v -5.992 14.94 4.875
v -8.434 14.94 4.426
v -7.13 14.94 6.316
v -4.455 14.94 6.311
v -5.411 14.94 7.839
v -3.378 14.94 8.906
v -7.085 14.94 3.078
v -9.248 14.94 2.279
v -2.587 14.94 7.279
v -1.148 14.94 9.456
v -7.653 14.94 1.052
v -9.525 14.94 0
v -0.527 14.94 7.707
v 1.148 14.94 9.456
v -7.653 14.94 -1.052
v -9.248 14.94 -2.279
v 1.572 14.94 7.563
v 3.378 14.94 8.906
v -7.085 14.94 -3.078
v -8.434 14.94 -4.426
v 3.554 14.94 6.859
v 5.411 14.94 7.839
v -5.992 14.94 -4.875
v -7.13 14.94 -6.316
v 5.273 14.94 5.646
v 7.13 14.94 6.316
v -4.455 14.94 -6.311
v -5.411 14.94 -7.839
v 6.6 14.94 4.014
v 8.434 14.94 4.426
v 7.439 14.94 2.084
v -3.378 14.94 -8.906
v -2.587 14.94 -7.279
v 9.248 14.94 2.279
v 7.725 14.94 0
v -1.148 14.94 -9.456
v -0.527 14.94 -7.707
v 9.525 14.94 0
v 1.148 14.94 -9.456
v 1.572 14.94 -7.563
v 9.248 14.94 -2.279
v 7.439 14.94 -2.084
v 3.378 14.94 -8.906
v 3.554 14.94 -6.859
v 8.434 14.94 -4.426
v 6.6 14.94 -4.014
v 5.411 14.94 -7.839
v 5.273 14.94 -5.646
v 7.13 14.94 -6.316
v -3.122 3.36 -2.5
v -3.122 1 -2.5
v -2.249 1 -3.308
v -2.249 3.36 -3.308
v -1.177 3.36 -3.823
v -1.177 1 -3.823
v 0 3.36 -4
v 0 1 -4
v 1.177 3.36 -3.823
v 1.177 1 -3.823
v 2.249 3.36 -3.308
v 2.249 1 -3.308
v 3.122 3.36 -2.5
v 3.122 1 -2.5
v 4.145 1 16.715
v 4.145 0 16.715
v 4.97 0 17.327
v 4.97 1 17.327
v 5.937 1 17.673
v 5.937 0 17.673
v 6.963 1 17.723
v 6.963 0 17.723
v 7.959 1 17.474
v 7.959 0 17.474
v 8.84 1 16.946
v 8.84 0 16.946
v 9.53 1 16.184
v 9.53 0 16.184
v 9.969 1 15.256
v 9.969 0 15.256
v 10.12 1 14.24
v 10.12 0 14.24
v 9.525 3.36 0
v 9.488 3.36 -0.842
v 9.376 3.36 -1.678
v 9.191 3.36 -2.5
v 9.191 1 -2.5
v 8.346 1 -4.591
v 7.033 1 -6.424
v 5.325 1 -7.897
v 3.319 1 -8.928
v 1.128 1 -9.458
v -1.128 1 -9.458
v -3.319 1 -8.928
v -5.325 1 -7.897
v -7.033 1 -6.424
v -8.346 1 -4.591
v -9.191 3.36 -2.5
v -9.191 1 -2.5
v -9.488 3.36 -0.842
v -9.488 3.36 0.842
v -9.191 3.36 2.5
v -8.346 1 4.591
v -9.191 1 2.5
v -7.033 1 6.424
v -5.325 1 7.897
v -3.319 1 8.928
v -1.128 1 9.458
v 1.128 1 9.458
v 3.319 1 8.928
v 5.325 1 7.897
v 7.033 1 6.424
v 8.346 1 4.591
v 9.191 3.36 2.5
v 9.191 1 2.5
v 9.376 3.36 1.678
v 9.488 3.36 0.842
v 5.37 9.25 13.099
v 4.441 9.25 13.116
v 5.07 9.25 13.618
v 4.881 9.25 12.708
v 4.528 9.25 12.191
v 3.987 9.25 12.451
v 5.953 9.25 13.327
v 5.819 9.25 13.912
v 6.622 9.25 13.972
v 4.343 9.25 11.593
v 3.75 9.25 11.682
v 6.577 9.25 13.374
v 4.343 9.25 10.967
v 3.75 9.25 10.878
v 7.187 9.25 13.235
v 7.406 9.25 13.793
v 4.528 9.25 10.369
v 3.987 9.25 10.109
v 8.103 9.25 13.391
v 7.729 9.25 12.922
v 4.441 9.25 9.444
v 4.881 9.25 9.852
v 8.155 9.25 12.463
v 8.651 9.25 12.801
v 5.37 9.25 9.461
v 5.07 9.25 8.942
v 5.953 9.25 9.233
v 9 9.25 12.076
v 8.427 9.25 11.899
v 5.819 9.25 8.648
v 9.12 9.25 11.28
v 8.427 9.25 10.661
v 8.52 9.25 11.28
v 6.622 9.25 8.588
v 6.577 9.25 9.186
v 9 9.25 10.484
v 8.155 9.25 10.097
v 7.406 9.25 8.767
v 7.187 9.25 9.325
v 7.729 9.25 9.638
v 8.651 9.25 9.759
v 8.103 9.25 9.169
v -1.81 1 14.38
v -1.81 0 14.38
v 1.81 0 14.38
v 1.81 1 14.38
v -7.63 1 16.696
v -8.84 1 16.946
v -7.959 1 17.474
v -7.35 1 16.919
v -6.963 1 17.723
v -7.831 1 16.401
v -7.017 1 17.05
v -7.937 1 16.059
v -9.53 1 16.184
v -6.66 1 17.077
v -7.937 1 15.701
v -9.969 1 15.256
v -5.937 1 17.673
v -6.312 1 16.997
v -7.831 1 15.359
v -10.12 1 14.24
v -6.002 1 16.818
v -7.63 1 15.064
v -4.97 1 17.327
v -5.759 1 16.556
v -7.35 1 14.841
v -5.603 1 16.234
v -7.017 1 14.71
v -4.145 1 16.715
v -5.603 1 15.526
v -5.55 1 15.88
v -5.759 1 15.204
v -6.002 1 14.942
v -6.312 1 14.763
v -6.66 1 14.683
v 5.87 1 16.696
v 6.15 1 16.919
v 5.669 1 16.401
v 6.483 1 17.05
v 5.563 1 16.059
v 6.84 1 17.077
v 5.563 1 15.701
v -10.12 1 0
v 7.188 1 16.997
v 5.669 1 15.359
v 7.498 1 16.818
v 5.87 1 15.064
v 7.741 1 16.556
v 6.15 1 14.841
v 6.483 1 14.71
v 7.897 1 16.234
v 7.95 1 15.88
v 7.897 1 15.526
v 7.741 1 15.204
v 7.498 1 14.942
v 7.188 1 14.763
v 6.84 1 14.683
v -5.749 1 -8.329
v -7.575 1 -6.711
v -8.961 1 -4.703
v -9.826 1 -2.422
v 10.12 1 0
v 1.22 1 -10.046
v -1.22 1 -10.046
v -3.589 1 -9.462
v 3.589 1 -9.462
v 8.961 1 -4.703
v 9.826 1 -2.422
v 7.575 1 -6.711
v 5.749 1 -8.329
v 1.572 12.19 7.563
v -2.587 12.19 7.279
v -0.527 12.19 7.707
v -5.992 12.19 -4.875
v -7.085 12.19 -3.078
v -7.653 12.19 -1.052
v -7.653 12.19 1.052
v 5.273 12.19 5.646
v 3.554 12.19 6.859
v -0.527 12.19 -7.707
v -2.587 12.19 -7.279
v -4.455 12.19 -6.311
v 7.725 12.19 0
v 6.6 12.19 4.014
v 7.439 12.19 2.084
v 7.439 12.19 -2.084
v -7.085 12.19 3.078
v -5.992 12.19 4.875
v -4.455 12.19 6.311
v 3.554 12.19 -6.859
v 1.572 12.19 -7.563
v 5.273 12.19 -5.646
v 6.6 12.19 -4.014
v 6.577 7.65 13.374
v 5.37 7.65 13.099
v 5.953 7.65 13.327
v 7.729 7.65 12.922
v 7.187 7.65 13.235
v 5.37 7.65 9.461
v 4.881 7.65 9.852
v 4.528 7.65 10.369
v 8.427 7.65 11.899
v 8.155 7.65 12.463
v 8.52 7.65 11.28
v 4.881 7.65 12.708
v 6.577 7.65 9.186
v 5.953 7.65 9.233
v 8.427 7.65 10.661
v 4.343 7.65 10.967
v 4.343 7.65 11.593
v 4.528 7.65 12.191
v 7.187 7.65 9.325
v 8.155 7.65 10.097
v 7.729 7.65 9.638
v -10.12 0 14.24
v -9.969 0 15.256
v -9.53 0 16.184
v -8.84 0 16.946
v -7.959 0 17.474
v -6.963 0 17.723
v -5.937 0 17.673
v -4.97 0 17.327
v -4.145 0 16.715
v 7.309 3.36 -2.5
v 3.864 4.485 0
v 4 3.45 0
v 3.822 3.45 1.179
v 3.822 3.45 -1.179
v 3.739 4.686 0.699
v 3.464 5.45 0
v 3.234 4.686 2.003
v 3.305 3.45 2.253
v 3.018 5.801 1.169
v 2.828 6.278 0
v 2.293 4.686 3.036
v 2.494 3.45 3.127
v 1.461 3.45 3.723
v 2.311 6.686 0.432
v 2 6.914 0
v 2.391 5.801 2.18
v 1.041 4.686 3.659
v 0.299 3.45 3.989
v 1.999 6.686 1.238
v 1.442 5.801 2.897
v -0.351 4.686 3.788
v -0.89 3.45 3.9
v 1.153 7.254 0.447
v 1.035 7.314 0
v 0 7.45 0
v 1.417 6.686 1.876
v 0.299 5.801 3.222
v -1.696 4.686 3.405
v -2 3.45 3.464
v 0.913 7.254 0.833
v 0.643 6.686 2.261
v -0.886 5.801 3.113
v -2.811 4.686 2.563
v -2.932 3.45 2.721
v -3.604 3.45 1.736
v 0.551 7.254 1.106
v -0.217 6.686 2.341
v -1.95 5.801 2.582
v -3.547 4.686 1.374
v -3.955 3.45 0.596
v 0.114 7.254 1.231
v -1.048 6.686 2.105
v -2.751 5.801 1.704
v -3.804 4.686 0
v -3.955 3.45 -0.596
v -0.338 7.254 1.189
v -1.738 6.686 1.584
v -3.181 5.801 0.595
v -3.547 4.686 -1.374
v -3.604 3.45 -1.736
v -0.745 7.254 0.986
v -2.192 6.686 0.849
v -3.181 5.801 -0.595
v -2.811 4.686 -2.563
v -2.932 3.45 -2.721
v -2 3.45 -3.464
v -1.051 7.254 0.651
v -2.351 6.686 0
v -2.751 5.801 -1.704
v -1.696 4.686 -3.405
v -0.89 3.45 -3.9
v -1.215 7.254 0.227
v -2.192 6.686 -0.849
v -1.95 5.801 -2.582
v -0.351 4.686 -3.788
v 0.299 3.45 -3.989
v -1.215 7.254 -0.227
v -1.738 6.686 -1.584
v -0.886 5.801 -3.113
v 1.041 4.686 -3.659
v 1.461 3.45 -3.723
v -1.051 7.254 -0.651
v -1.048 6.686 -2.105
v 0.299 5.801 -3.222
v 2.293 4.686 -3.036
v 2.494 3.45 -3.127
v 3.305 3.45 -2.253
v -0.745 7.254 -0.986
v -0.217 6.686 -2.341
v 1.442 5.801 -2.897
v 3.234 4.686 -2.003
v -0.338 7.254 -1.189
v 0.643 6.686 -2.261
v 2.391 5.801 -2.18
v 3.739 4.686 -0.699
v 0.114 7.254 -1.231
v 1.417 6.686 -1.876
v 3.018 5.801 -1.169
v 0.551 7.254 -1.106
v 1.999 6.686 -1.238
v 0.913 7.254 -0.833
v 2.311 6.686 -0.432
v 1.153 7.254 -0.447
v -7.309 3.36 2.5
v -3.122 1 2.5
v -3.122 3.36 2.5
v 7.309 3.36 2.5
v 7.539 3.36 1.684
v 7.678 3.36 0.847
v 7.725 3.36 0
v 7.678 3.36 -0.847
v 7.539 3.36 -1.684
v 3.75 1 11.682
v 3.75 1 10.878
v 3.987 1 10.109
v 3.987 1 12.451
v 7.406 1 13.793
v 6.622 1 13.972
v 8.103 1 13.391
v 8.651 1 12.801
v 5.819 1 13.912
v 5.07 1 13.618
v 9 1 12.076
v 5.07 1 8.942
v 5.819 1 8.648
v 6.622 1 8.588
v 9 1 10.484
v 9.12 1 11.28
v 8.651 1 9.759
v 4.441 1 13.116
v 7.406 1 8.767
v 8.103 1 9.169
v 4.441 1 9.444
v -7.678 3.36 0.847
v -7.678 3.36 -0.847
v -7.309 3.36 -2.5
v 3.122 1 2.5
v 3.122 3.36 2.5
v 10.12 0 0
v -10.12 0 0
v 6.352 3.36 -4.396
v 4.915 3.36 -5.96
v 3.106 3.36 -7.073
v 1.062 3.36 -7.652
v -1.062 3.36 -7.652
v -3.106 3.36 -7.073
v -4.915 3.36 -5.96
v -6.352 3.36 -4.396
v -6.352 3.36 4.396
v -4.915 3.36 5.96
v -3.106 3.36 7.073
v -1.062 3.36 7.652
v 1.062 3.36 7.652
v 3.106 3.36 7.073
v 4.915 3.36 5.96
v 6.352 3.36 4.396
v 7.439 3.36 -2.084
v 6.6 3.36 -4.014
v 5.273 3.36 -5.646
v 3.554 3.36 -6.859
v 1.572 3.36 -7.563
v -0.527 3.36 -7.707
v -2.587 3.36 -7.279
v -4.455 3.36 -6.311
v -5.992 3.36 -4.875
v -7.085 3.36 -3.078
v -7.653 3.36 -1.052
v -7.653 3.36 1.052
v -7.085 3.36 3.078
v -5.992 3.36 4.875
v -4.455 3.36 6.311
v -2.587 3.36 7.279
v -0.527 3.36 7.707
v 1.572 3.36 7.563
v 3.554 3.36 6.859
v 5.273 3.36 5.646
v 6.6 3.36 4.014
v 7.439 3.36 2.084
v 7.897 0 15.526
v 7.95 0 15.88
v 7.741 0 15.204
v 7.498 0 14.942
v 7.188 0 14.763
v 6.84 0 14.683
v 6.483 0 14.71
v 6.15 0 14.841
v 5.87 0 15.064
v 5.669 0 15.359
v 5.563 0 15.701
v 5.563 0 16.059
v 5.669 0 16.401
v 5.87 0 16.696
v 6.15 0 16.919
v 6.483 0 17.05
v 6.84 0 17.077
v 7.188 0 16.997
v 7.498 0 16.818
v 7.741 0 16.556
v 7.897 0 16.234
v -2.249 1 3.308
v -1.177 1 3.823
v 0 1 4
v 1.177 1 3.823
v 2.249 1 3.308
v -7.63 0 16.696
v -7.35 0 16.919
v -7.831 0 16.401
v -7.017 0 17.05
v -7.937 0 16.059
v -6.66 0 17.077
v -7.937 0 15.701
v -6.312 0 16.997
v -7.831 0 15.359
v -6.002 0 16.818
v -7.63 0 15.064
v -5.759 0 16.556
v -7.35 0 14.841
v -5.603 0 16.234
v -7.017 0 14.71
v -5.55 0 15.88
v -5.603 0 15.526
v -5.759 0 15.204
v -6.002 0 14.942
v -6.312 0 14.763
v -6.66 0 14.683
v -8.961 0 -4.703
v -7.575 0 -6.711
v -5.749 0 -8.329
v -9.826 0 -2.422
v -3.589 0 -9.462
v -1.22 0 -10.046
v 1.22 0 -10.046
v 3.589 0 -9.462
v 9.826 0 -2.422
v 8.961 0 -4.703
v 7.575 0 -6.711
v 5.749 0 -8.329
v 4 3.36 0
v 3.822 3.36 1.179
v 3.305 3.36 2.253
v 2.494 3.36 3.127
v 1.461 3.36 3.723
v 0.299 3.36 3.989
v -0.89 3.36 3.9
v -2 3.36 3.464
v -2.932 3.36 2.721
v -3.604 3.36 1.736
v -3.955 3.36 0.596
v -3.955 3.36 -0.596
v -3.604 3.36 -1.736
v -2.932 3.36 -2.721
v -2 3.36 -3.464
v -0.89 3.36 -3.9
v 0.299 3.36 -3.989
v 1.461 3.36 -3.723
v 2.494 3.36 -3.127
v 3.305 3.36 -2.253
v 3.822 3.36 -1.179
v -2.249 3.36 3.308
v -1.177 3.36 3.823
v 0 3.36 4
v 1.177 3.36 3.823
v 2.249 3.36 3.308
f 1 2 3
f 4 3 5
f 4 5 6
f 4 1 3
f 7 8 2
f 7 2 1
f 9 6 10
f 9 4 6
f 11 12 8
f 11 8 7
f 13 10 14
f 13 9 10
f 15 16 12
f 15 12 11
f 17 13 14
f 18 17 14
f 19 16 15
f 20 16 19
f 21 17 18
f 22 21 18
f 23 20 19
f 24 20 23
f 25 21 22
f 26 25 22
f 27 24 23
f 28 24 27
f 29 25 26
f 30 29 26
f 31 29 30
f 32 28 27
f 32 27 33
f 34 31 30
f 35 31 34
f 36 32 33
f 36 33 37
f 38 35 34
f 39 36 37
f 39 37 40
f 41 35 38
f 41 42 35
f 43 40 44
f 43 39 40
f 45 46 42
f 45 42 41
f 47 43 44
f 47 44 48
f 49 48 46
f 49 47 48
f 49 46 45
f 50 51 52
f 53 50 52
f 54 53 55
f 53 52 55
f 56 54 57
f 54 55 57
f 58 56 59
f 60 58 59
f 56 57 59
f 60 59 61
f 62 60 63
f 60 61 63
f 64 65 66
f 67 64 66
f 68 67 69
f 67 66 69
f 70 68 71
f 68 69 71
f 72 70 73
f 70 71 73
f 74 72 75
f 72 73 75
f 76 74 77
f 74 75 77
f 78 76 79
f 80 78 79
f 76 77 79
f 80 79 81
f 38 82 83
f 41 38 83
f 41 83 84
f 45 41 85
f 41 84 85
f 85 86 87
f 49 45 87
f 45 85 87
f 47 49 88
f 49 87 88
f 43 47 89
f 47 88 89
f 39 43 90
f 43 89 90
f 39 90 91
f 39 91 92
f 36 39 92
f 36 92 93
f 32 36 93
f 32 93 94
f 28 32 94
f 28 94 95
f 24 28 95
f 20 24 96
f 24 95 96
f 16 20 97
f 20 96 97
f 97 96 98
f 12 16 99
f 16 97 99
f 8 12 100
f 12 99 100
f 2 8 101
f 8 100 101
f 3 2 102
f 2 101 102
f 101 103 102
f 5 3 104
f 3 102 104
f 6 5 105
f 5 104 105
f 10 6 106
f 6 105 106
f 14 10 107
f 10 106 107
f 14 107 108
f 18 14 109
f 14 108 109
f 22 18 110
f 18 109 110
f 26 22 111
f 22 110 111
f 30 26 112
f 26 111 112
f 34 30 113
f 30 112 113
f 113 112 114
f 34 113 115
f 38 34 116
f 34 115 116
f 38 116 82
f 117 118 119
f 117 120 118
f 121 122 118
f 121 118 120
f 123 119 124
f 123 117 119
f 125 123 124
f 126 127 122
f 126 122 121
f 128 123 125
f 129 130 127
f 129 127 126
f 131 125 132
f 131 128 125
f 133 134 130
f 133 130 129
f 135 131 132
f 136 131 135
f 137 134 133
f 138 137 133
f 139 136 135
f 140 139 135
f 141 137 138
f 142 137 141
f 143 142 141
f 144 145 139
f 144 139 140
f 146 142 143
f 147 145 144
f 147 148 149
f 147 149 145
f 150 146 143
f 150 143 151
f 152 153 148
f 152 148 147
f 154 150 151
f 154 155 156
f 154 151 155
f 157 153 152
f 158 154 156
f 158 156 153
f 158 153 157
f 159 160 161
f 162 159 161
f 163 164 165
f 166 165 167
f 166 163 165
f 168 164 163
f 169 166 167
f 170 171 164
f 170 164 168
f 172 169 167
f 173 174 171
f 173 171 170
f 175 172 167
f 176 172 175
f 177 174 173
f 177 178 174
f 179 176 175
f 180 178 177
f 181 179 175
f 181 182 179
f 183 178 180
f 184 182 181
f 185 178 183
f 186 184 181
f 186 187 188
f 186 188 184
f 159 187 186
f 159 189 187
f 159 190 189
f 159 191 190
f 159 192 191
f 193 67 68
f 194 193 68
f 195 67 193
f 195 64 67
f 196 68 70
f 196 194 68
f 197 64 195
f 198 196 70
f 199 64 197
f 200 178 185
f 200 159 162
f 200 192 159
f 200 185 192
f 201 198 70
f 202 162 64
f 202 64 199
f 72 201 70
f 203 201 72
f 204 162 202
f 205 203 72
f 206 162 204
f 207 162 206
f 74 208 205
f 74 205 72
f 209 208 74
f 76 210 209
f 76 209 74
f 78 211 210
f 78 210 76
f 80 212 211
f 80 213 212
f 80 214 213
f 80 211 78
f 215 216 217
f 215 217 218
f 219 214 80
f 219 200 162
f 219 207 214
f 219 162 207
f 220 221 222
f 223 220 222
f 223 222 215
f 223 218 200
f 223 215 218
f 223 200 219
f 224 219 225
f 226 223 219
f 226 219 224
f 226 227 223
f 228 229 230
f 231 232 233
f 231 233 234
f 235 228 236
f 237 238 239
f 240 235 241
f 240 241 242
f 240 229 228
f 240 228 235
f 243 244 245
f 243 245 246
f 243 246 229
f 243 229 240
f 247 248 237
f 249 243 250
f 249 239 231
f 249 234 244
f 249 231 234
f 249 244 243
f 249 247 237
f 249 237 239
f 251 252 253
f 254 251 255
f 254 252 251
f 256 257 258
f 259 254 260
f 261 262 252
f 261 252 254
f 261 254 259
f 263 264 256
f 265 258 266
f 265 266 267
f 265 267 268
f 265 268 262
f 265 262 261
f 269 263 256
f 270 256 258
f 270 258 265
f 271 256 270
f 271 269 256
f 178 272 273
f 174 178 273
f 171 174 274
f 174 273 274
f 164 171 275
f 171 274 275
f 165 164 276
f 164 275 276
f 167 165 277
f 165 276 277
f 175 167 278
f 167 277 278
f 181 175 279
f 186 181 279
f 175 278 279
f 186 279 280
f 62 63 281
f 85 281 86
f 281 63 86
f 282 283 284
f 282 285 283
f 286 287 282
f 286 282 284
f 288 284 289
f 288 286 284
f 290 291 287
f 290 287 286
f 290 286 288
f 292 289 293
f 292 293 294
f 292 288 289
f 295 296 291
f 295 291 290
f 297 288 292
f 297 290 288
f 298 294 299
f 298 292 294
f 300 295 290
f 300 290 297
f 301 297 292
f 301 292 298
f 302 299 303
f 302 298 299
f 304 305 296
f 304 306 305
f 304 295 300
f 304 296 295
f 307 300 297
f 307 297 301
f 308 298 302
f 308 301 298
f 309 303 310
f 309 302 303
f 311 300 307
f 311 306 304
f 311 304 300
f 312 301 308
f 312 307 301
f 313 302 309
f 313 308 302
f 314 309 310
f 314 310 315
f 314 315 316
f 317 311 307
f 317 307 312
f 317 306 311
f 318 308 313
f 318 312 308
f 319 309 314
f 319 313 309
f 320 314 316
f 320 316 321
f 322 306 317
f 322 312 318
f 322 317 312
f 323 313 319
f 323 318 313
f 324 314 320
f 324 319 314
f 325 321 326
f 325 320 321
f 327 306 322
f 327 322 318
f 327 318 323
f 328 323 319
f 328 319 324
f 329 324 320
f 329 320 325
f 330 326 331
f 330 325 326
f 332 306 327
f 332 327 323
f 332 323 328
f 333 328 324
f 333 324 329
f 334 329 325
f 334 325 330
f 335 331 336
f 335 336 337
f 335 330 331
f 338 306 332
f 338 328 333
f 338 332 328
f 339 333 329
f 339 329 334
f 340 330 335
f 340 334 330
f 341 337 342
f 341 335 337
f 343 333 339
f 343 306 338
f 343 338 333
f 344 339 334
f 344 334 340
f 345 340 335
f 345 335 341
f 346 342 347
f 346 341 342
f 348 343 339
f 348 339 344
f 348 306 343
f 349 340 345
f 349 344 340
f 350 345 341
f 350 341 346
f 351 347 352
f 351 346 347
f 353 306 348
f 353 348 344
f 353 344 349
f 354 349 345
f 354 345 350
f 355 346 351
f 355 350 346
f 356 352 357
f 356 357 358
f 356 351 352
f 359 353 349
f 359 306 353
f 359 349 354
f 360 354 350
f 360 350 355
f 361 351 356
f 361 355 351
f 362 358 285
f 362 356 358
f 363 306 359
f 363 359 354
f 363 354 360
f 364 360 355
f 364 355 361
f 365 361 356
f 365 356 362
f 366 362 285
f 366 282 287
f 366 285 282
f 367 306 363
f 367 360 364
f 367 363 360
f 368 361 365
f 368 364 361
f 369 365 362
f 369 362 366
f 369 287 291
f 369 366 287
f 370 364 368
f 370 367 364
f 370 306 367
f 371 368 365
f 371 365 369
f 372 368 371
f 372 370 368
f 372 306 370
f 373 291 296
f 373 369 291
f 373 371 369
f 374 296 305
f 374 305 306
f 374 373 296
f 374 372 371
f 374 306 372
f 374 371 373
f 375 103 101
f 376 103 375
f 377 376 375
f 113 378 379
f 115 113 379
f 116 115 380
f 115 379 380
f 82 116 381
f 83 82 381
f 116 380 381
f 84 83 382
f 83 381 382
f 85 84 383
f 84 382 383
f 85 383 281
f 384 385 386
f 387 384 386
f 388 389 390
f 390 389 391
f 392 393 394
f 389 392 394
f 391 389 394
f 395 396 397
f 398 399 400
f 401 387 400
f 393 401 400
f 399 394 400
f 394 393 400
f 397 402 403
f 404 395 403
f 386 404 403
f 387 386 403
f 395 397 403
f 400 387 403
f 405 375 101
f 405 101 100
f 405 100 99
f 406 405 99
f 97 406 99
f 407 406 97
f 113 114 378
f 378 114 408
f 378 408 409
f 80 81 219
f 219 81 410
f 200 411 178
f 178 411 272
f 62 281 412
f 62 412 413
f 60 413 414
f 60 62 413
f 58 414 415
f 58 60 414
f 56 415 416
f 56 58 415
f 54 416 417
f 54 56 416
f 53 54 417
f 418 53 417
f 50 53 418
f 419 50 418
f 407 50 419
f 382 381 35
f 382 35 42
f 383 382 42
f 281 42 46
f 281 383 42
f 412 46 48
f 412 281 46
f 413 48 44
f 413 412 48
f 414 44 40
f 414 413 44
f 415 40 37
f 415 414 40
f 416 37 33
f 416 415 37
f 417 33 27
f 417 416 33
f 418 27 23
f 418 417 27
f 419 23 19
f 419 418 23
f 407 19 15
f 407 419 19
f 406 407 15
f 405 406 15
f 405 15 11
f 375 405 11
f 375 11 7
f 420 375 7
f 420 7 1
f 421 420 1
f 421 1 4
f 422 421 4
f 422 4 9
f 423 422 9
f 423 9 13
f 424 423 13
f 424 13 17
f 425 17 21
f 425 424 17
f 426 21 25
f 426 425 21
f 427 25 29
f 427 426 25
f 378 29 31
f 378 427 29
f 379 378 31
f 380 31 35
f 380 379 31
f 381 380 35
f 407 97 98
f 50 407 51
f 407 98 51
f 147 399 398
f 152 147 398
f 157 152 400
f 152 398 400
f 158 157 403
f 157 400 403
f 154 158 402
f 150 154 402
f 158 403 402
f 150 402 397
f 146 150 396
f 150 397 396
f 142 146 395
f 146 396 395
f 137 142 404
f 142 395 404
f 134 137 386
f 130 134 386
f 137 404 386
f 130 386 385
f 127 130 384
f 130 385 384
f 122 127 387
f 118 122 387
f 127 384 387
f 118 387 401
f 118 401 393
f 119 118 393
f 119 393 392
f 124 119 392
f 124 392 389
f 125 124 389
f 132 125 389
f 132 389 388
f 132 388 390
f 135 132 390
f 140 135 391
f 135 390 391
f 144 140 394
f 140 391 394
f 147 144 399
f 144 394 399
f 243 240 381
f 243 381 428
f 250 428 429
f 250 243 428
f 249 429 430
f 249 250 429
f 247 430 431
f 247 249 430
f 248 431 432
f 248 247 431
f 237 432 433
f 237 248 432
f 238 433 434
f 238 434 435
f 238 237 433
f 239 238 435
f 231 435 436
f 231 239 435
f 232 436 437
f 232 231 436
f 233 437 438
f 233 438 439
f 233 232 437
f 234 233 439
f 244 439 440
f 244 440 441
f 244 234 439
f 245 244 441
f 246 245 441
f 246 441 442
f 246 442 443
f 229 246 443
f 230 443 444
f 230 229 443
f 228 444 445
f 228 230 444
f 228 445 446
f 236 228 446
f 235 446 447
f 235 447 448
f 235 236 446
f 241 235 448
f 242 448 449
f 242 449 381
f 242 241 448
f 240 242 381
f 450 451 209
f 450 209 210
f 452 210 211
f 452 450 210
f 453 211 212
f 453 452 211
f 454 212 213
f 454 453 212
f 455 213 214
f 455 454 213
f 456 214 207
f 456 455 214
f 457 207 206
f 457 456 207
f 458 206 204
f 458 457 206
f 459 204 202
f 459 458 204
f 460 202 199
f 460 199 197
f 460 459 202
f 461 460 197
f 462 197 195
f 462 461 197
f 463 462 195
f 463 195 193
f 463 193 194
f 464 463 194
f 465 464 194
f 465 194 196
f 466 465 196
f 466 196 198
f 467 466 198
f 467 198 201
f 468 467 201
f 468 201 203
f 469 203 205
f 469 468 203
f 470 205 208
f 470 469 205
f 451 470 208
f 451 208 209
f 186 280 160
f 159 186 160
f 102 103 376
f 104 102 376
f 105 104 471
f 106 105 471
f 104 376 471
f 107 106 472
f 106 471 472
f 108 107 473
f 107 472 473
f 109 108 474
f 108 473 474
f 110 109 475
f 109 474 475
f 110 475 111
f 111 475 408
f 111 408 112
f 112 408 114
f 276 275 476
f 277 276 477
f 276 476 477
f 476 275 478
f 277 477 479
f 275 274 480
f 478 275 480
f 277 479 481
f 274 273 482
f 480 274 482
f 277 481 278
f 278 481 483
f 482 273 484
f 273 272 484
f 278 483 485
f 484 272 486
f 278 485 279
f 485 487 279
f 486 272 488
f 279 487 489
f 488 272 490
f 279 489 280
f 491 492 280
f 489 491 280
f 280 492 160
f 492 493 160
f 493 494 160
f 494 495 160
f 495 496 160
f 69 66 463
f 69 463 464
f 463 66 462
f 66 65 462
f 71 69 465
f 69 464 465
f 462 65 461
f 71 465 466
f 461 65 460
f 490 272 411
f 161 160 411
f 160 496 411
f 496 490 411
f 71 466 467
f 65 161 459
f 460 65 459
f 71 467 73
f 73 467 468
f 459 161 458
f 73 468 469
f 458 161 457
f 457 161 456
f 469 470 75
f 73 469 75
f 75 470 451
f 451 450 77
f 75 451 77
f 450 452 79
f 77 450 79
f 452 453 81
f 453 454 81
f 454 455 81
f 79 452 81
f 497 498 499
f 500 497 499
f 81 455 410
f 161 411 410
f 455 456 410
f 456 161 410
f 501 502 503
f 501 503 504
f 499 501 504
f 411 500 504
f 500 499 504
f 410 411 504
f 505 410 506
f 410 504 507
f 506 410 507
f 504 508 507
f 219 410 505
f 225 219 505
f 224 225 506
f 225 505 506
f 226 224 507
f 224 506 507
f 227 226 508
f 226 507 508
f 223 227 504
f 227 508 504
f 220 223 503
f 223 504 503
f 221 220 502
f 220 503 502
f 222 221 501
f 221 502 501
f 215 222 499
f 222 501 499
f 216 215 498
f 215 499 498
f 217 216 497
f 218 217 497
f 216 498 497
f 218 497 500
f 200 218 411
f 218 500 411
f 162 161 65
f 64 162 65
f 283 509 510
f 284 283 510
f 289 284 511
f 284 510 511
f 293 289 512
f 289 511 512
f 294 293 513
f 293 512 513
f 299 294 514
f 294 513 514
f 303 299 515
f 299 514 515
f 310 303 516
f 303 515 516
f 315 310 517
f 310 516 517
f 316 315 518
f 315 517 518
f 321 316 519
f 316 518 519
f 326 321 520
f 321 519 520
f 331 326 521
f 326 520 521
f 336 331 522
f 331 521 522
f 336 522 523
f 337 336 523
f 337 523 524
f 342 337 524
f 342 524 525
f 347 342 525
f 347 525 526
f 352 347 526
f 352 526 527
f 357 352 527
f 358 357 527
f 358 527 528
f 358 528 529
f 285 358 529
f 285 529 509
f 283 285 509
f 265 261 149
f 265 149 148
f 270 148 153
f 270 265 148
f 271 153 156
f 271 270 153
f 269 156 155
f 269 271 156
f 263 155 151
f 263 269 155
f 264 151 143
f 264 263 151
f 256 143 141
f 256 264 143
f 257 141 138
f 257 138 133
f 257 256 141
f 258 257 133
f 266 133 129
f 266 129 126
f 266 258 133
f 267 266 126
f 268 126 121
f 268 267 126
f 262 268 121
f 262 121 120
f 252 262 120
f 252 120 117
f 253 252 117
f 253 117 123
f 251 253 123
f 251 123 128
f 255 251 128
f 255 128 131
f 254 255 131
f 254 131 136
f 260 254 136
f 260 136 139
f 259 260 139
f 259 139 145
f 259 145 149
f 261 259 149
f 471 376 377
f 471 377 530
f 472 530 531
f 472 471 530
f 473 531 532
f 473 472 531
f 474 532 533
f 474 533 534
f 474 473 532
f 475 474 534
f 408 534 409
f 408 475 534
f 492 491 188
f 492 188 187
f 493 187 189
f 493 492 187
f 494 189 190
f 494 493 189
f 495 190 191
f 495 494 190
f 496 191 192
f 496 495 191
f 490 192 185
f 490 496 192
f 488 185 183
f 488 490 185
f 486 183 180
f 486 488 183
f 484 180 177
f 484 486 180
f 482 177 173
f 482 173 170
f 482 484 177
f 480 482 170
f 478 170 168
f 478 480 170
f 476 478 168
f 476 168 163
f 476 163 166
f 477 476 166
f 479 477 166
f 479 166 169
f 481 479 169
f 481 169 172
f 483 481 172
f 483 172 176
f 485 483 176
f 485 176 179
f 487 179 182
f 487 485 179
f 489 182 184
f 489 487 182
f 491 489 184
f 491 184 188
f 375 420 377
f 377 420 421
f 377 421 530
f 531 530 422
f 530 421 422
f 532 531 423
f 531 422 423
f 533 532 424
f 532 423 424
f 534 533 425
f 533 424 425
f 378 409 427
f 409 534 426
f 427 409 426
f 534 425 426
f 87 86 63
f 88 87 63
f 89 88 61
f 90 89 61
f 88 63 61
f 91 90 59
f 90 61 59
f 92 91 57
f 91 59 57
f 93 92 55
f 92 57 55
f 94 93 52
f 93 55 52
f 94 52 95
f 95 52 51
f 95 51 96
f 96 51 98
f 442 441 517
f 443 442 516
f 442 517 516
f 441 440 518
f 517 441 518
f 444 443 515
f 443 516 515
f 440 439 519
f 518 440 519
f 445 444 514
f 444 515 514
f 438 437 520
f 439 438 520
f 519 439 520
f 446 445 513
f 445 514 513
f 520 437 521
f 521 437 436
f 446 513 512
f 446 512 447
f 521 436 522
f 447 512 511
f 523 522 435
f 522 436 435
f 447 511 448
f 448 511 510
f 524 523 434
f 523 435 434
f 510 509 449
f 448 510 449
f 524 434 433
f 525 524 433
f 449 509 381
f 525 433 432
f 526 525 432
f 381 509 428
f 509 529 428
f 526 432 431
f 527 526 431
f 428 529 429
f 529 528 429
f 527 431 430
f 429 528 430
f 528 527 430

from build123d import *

# Parameters (mm, degrees)
SKETCH1_R               = 1.2
BOSS_EXTRUDE1_DEPTH     = 1
SKETCH4_R               = 9.525
SKETCH4_R_2             = 7.725
BOSS_EXTRUDE2_DEPTH     = 13.94
SKETCH5_W               = 5
SKETCH5_H               = 2.36
CUT_EXTRUDE1_DEPTH      = 11.12
CUT_EXTRUDE1_DEPTH_BACK = 11.12
BOSS_EXTRUDE3_START     = -2.75
SKETCH6_R               = 7.725
BOSS_EXTRUDE3_DEPTH     = 8.83
SKETCH7_R               = 2.7
SKETCH7_R_2             = 2.1
EXTRUDE_THIN1_DEPTH     = 8.25
BOSS_EXTRUDE4_START     = -1.6
SKETCH8_R               = 2.1
BOSS_EXTRUDE4_DEPTH     = 6.65
SKETCH9_R               = 4
CUT_EXTRUDE2_DEPTH      = 6.45
FILLET1_R               = 4
BOSS_EXTRUDE5_DEPTH     = 2.36


with BuildPart() as part:
    # Sketch1 → Boss-Extrude1 (new body)
    with BuildSketch(Plane(origin=(0, 0, 0), x_dir=(1, 0, 0), z_dir=(0, 1, 0))):
        with BuildLine():
            Line((-10.12, 0), (-10.12, -14.24))
            ThreePointArc((-10.12, -14.24), (-7.959392013, -17.473578364), (-4.145126266, -16.714873734))
            Line((-4.145126266, -16.714873734), (-1.810252532, -14.38))
            Line((-1.810252532, -14.38), (1.810252532, -14.38))
            Line((1.810252532, -14.38), (4.145126266, -16.714873734))
            ThreePointArc((4.145126266, -16.714873734), (7.959392013, -17.473578364), (10.12, -14.24))
            Line((10.12, -14.24), (10.12, 0))
            ThreePointArc((10.12, 0), (0, 10.12), (-10.12, 0))
        make_face()
        with Locations((-6.75, -15.88)):
            Circle(SKETCH1_R, mode=Mode.SUBTRACT)
        with Locations((6.75, -15.88)):
            Circle(SKETCH1_R, mode=Mode.SUBTRACT)
    extrude(amount=BOSS_EXTRUDE1_DEPTH)


with BuildPart() as body_2:
    # Sketch4 → Boss-Extrude2 (new body)
    with BuildSketch(Plane(origin=(0, 1, 0), x_dir=(1, 0, 0), z_dir=(0, 1, 0))):
        Circle(SKETCH4_R)
        Circle(SKETCH4_R_2, mode=Mode.SUBTRACT)
    extrude(amount=BOSS_EXTRUDE2_DEPTH)

    # Sketch5 → Cut-Extrude1 (cut, two sides)
    with BuildSketch(Plane(origin=(0, 0, 0), x_dir=(0, 0, -1), z_dir=(1, 0, 0))) as cut_extrude1_sk:
        with Locations((0, 2.18)):
            Rectangle(SKETCH5_W, SKETCH5_H)
    extrude(amount=CUT_EXTRUDE1_DEPTH, mode=Mode.SUBTRACT)
    extrude(cut_extrude1_sk.sketch, amount=-CUT_EXTRUDE1_DEPTH_BACK, mode=Mode.SUBTRACT)

    # Sketch10 → Boss-Extrude5 (add)
    with BuildSketch(Plane.XZ.offset(-1)):
        with BuildLine():
            Line((-7.309283481, -2.5), (-3.122498999, -2.5))
            ThreePointArc((-3.122498999, -2.5), (0, -4), (3.122498999, -2.5))
            Line((3.122498999, -2.5), (7.309283481, -2.5))
            ThreePointArc((7.309283481, -2.5), (0, -7.725), (-7.309283481, -2.5))
        make_face()
        with BuildLine():
            Line((-7.309283481, 2.5), (-3.122498999, 2.5))
            ThreePointArc((-3.122498999, 2.5), (0, 4), (3.122498999, 2.5))
            Line((3.122498999, 2.5), (7.309283481, 2.5))
            ThreePointArc((7.309283481, 2.5), (0, 7.725), (-7.309283481, 2.5))
        make_face()
    extrude(amount=-BOSS_EXTRUDE5_DEPTH)


with BuildPart() as body_3:
    # Sketch6 → Boss-Extrude3 (new body)
    with BuildSketch(Plane(origin=(0, 14.94, 0), x_dir=(1, 0, 0), z_dir=(0, 1, 0)).offset(BOSS_EXTRUDE3_START)):
        Circle(SKETCH6_R)
    extrude(amount=-BOSS_EXTRUDE3_DEPTH)

    # Sketch9 → Cut-Extrude2 (cut)
    with BuildSketch(Plane.XZ.offset(-1)):
        Circle(SKETCH9_R)
    extrude(amount=-CUT_EXTRUDE2_DEPTH, mode=Mode.SUBTRACT)

    # Fillet1
    fillet1_edges = [body_3.edges().sort_by_distance(p)[0] for p in [
        (-4, 7.45, 0),
    ]]
    fillet(fillet1_edges, radius=FILLET1_R)


with BuildPart() as body_4:
    # Sketch7 → Extrude-Thin1 (new body)
    with BuildSketch(Plane(origin=(0, 1, 0), x_dir=(1, 0, 0), z_dir=(0, 1, 0))):
        with Locations((6.42, -11.28)):
            Circle(SKETCH7_R)
        with Locations((6.42, -11.28)):
            Circle(SKETCH7_R_2, mode=Mode.SUBTRACT)
    extrude(amount=EXTRUDE_THIN1_DEPTH)

    # Sketch8 → Boss-Extrude4 (add)
    with BuildSketch(Plane(origin=(0, 9.25, 0), x_dir=(1, 0, 0), z_dir=(0, 1, 0)).offset(BOSS_EXTRUDE4_START)):
        with Locations((6.42, -11.28)):
            Circle(SKETCH8_R)
    extrude(amount=-BOSS_EXTRUDE4_DEPTH)


solid = Compound([part.part, body_2.part, body_3.part, body_4.part])
